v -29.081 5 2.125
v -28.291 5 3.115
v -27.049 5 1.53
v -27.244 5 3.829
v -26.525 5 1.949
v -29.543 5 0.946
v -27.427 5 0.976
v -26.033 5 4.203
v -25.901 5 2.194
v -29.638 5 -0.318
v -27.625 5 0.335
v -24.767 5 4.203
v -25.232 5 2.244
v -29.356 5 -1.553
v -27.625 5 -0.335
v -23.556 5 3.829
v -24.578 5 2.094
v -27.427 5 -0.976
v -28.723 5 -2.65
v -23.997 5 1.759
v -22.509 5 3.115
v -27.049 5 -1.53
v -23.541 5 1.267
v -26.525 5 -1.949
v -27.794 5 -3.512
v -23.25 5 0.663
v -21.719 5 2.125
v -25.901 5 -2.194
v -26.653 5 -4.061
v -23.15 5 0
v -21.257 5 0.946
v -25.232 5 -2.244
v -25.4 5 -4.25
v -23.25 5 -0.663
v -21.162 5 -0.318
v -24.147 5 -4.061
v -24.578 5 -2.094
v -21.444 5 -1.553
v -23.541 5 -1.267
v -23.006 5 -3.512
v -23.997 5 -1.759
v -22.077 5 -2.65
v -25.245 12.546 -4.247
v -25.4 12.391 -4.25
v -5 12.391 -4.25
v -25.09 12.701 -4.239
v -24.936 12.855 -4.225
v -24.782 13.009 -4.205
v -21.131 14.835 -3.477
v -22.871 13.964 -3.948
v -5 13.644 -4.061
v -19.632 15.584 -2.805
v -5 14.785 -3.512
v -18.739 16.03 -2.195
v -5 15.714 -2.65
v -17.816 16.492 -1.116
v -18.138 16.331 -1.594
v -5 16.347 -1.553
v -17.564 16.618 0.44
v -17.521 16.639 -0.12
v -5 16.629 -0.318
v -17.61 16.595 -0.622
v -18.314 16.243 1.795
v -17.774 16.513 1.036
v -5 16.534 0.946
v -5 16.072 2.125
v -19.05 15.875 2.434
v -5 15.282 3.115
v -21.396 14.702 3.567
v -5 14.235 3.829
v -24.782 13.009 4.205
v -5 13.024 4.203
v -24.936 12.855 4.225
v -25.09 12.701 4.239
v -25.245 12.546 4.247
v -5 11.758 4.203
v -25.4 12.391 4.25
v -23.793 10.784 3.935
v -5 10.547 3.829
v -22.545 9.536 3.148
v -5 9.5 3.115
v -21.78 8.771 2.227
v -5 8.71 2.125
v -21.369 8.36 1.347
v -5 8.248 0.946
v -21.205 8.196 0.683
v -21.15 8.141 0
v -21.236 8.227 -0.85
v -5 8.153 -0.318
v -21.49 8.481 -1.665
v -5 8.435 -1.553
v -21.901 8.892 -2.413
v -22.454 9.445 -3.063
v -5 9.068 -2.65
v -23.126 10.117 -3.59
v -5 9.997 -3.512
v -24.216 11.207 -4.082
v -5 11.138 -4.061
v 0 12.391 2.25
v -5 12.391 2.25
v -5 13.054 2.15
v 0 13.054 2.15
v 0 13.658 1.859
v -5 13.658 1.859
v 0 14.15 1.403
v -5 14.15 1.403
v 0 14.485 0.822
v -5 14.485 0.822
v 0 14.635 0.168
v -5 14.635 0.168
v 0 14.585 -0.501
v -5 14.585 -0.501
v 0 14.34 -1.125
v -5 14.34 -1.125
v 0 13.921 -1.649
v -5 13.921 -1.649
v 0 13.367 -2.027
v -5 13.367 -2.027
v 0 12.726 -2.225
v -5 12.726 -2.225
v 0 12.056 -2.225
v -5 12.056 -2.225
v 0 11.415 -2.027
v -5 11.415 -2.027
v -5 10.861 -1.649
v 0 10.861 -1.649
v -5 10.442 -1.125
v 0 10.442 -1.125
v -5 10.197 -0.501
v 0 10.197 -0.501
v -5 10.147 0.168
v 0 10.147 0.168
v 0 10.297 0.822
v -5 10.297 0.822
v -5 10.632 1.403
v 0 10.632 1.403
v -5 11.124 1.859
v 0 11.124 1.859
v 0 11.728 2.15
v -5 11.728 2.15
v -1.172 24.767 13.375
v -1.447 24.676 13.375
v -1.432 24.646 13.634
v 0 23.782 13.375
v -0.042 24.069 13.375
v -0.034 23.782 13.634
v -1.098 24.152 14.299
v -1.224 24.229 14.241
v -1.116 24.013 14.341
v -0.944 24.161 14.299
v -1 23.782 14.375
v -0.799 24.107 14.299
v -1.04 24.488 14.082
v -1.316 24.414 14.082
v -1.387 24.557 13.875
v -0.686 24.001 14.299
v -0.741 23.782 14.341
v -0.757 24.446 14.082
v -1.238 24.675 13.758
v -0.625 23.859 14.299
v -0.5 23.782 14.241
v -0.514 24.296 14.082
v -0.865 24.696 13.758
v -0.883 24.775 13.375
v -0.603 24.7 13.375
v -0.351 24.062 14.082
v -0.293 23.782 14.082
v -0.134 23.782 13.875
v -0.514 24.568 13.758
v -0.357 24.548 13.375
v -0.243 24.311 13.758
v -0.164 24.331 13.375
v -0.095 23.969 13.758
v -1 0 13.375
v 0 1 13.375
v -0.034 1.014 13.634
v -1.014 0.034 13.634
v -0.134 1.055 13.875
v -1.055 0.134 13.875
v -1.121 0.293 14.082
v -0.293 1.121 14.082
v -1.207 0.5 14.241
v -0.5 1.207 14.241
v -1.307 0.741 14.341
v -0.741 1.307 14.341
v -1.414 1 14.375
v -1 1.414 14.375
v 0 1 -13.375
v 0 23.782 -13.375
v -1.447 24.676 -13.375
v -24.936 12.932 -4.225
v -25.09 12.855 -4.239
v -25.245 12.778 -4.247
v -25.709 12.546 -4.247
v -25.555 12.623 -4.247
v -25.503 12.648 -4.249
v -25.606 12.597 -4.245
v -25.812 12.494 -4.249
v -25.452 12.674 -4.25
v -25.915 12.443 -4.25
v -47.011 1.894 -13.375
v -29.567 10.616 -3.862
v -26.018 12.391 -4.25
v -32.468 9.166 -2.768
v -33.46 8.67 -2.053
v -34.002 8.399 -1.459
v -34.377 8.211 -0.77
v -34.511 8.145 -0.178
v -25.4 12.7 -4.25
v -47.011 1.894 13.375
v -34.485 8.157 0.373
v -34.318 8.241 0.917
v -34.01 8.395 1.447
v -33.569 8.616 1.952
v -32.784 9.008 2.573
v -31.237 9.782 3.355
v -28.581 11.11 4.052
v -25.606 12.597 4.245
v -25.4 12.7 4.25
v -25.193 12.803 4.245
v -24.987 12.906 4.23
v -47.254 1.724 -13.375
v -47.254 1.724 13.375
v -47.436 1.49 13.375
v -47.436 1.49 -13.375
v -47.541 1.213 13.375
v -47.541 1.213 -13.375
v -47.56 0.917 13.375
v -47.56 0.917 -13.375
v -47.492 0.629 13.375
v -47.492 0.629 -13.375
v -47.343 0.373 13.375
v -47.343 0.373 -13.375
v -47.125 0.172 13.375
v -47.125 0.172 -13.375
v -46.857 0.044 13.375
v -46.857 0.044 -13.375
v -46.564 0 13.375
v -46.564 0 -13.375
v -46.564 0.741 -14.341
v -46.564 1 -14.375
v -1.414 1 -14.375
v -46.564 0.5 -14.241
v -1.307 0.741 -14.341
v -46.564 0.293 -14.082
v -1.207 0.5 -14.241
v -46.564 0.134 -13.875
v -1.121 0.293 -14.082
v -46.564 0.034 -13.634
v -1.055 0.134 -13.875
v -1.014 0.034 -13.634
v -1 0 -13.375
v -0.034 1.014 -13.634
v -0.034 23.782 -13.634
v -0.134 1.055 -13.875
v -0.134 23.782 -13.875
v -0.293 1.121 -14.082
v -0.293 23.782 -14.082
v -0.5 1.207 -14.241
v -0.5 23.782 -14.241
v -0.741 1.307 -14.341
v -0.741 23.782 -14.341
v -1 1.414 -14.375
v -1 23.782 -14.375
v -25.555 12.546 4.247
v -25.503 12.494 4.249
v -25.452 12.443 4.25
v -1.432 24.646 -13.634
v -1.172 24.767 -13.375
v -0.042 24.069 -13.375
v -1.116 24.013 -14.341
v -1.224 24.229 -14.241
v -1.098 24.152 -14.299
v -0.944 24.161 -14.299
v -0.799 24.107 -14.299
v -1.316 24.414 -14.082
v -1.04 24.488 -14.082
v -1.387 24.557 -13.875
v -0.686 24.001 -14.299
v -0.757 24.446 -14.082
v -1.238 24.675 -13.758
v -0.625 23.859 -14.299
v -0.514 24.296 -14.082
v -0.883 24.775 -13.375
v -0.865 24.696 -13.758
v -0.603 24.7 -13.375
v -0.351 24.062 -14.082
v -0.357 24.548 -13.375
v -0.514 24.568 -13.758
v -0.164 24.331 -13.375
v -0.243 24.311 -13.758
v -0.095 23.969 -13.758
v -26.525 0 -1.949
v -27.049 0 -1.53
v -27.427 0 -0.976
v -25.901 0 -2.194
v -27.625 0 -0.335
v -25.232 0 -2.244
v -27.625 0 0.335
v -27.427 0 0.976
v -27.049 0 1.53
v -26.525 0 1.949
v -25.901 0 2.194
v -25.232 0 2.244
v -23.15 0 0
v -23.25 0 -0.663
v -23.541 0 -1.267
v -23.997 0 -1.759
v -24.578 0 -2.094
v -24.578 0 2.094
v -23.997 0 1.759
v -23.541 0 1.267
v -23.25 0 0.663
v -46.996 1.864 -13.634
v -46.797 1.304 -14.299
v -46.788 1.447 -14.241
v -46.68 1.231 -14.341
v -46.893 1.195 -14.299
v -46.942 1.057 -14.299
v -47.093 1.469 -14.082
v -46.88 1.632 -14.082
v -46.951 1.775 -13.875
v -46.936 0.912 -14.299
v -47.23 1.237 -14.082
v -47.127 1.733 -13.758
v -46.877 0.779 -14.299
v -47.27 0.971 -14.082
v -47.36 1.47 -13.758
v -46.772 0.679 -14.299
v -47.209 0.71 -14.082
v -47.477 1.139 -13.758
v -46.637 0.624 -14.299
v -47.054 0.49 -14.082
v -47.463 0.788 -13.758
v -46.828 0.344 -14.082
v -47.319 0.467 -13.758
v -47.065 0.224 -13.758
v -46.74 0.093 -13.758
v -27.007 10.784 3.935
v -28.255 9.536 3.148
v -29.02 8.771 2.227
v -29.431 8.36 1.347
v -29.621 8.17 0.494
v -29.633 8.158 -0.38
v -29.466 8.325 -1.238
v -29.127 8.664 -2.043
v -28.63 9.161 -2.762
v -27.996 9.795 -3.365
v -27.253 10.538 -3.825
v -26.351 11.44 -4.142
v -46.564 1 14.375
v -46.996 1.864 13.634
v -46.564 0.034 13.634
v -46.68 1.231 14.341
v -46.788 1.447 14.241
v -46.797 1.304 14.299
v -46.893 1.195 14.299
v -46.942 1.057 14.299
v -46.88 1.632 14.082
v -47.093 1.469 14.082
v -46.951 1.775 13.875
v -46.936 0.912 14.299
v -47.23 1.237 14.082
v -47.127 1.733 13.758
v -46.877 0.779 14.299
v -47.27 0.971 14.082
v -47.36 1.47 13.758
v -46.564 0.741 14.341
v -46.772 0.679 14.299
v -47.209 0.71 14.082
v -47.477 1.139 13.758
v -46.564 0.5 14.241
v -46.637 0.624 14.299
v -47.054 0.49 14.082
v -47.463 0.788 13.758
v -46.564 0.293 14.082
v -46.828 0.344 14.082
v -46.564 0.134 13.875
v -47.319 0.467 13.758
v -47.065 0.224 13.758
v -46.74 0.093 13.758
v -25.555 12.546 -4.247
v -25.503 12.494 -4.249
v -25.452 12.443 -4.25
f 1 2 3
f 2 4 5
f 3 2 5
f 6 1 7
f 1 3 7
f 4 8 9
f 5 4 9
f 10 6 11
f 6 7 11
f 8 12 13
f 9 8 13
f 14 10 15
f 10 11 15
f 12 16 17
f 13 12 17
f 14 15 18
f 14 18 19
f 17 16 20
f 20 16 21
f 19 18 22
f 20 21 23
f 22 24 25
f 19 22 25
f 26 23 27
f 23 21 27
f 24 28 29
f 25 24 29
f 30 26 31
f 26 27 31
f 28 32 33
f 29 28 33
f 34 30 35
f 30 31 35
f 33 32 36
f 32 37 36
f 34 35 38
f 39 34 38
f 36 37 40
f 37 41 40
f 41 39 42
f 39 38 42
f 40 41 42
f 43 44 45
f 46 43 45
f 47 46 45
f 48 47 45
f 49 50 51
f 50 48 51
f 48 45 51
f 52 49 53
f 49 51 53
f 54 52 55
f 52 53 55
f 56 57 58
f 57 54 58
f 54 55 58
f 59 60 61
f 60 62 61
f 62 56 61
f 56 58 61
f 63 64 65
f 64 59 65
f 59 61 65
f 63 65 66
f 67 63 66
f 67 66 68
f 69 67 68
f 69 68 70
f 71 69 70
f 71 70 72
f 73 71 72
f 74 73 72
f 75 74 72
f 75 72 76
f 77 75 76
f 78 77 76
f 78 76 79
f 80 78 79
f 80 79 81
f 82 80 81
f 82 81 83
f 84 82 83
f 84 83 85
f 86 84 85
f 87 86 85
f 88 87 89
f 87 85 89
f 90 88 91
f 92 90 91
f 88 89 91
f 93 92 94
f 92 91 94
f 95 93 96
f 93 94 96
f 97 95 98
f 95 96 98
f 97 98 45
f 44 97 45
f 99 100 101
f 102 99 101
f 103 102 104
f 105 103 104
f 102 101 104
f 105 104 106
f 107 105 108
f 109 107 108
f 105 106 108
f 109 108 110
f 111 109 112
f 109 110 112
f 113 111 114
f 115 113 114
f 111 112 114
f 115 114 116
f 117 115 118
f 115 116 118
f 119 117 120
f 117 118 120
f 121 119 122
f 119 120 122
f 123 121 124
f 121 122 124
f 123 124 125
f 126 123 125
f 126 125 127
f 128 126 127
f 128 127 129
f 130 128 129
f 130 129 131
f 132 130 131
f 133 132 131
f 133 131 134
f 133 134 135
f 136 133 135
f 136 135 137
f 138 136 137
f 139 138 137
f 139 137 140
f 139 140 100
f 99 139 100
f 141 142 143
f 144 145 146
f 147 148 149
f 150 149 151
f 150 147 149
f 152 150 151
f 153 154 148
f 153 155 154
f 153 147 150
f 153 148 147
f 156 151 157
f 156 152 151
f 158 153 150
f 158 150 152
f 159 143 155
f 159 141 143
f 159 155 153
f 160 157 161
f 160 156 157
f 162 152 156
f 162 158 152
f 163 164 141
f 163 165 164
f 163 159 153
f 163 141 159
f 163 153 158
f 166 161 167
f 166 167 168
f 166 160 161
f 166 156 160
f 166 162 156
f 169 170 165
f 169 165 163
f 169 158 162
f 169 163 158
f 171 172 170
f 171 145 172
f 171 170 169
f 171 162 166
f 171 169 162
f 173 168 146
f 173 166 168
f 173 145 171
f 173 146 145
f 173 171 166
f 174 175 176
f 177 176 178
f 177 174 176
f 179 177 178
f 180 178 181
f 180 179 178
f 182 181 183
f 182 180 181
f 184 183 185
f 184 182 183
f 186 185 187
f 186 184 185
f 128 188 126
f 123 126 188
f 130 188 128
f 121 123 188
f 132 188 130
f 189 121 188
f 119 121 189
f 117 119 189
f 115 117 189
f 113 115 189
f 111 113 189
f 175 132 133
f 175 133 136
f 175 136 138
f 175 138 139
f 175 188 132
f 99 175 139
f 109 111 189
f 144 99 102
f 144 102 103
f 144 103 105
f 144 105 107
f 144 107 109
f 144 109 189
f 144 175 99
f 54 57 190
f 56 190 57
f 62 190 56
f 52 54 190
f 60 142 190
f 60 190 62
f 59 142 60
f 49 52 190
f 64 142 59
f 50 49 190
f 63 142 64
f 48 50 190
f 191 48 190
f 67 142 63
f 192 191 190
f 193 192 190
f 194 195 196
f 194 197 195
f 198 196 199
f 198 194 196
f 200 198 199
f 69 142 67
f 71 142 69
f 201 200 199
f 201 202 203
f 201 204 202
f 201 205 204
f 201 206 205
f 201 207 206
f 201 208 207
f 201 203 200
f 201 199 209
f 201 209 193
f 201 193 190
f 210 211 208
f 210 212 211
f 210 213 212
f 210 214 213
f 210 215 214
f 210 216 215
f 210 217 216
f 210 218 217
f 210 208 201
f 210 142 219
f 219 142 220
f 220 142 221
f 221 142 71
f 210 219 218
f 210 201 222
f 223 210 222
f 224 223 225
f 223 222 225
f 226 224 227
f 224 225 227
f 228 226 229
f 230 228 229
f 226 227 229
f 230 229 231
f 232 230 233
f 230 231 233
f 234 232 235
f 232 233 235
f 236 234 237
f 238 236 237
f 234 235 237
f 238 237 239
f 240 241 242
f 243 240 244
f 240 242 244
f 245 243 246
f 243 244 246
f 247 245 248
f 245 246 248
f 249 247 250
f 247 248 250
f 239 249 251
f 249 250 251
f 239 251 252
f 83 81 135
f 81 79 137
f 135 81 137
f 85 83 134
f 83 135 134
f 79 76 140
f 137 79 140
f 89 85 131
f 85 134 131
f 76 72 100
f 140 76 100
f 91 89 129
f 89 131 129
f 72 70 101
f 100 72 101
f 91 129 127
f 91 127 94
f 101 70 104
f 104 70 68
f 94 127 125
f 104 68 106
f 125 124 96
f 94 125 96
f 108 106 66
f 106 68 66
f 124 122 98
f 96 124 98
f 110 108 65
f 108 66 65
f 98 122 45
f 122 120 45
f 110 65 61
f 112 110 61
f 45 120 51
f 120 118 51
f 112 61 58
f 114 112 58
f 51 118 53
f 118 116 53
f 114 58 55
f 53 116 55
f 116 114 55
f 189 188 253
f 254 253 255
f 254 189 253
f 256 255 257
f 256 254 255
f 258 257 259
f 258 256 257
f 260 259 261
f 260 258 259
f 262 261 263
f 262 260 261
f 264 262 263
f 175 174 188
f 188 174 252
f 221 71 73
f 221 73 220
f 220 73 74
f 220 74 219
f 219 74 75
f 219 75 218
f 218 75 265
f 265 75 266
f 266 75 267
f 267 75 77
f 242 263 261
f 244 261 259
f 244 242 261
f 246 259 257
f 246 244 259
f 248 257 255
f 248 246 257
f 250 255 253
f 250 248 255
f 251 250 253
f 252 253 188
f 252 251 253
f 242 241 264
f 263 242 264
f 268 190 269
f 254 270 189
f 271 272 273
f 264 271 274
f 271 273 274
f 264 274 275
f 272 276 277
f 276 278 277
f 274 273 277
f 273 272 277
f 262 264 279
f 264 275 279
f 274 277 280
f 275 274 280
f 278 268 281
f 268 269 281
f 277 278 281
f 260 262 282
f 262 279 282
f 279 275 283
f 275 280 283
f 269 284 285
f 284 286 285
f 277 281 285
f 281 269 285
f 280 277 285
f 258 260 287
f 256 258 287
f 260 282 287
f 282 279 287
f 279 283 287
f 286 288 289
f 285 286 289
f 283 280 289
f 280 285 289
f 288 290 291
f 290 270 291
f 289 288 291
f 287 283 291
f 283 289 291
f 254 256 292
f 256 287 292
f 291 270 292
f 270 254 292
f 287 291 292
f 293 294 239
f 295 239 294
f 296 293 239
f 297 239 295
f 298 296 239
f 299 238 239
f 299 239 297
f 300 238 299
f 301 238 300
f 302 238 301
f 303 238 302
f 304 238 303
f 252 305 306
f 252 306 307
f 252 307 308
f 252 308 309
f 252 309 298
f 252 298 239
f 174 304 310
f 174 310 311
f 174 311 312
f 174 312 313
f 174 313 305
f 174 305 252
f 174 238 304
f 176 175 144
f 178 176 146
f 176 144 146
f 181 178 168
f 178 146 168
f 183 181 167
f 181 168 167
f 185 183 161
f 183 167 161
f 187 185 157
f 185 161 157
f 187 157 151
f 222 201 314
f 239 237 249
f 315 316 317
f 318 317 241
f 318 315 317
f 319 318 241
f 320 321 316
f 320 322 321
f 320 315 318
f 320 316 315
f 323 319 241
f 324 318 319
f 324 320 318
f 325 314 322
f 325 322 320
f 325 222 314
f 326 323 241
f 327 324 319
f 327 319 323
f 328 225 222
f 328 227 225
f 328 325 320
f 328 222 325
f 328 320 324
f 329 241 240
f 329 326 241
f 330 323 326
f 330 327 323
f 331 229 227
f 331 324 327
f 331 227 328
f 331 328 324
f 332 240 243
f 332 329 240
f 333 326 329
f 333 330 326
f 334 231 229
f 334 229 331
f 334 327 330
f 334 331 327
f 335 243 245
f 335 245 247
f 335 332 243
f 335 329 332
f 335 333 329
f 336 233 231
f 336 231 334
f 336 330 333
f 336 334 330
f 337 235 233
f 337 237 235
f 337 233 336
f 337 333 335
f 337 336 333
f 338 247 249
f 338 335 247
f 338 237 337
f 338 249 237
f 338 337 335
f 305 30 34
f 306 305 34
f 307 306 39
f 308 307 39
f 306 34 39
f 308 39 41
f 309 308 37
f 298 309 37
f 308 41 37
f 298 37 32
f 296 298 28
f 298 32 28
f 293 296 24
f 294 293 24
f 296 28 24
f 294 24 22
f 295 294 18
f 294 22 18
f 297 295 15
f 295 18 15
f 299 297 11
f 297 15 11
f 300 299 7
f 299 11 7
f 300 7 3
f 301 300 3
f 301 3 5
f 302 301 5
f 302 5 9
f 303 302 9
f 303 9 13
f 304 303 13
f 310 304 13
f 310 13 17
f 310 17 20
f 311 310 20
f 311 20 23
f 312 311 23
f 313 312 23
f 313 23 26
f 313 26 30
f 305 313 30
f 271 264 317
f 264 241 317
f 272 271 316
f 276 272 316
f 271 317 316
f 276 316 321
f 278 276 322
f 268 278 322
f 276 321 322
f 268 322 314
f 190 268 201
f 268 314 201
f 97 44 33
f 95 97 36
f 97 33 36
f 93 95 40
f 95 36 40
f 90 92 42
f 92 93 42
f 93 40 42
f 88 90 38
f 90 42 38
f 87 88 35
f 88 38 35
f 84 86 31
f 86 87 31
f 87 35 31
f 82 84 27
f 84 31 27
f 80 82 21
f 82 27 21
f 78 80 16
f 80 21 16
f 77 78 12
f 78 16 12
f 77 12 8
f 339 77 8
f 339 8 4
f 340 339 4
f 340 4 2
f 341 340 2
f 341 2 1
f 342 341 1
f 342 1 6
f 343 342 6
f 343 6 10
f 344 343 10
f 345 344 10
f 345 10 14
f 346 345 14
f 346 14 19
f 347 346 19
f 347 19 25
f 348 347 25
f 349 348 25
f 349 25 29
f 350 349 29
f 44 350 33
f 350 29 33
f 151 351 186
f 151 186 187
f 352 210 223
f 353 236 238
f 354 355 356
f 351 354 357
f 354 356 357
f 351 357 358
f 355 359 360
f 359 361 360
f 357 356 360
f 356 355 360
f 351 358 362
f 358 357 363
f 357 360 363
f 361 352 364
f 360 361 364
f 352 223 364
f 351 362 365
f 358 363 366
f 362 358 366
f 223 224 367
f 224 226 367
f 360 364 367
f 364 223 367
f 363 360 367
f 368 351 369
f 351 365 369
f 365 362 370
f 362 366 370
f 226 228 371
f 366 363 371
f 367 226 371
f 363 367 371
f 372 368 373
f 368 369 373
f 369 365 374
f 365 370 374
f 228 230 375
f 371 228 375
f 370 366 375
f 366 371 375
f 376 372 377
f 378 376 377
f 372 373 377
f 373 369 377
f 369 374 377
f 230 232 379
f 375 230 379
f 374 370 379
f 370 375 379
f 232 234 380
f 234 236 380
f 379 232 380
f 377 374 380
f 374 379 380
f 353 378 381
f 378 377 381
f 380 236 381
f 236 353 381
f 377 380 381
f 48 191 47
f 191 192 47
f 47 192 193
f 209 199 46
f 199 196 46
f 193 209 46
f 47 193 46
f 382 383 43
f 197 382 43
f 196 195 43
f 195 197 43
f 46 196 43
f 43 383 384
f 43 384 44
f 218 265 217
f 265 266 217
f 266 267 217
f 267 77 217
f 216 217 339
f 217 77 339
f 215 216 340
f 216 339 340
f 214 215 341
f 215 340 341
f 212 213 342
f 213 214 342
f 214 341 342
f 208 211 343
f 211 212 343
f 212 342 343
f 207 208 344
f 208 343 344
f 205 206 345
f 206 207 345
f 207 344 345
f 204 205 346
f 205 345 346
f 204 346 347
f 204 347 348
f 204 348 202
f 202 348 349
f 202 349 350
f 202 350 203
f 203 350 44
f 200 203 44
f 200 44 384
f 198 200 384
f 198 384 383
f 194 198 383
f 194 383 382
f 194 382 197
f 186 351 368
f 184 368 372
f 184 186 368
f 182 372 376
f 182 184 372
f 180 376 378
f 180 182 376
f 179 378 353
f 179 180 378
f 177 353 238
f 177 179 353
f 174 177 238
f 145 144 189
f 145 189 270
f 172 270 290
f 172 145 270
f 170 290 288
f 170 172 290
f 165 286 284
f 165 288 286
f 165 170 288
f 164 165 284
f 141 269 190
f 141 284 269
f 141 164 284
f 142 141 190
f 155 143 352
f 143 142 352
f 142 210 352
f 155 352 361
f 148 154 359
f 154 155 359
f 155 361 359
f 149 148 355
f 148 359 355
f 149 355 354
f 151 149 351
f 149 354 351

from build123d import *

# Parameters (mm, degrees)
BOSS_EXTRUDE2_DEPTH  = 14.375
M4_CLEARANCE_HOLE2_D = 4.5
CUT_EXTRUDE1_START   = -5
SKETCH10_R           = 4.25
CUT_EXTRUDE1_DEPTH   = 30
M4_CLEARANCE_HOLE3_D = 4.5
CUT_EXTRUDE2_START   = -5
SKETCH14_R           = 4.25
CUT_EXTRUDE2_DEPTH   = 30
CHAMFER1_SIZE        = 1
FILLET2_R            = 1


with BuildPart() as part:
    # Sketch5 → Boss-Extrude2 (new, symmetric)
    with BuildSketch(Plane.XY):
        Polygon((0, 0), (0, 25.4), (-50.8, 0), align=None)
    extrude(amount=BOSS_EXTRUDE2_DEPTH, both=True)

    # M4 Clearance Hole2 (through all)
    with Locations(Plane(origin=(0, 0, 0), x_dir=(0, 0, -1), z_dir=(1, 0, 0))):
        with Locations((0, 12.390983006)):
            Hole(M4_CLEARANCE_HOLE2_D / 2)

    # Sketch10 → Cut-Extrude1 (cut)
    with BuildSketch(Plane(origin=(0, 0, 0), x_dir=(0, 0, -1), z_dir=(1, 0, 0)).offset(CUT_EXTRUDE1_START)):
        with Locations((0, 12.390983006)):
            Circle(SKETCH10_R)
    extrude(amount=-CUT_EXTRUDE1_DEPTH, mode=Mode.SUBTRACT)

    # M4 Clearance Hole3 (through all)
    with Locations(Plane(origin=(0, 0, 0), x_dir=(-1, 0, 0), z_dir=(0, -1, 0))):
        with Locations((25.4, 0)):
            Hole(M4_CLEARANCE_HOLE3_D / 2)

    # Sketch14 → Cut-Extrude2 (cut)
    with BuildSketch(Plane.XZ.offset(CUT_EXTRUDE2_START)):
        with Locations(Location((-25.4, 0, 0), (0, 0, 270))):
            Circle(SKETCH14_R)
    extrude(amount=-CUT_EXTRUDE2_DEPTH, mode=Mode.SUBTRACT)

    # Chamfer1
    chamfer1_edges = [part.edges().sort_by_distance(p)[0] for p in [
        (0, 0, 0),
    ]]
    chamfer(chamfer1_edges, length=CHAMFER1_SIZE)

    # Fillet2
    fillet2_edges = [part.edges().sort_by_distance(p)[0] for p in [
        (-25.4, 12.7, 14.375),
        (-25.4, 12.7, -14.375),
        (-25.9, 0, -14.375),
        (-25.9, 0, 14.375),
        (0, 13.2, -14.375),
        (0, 13.2, 14.375),
        (-0.5, 0.5, -14.375),
        (-0.5, 0.5, 14.375),
        (-50.8, 0, 0),
        (0, 25.4, 0),
    ]]
    fillet(fillet2_edges, radius=FILLET2_R)


solid = part.part
